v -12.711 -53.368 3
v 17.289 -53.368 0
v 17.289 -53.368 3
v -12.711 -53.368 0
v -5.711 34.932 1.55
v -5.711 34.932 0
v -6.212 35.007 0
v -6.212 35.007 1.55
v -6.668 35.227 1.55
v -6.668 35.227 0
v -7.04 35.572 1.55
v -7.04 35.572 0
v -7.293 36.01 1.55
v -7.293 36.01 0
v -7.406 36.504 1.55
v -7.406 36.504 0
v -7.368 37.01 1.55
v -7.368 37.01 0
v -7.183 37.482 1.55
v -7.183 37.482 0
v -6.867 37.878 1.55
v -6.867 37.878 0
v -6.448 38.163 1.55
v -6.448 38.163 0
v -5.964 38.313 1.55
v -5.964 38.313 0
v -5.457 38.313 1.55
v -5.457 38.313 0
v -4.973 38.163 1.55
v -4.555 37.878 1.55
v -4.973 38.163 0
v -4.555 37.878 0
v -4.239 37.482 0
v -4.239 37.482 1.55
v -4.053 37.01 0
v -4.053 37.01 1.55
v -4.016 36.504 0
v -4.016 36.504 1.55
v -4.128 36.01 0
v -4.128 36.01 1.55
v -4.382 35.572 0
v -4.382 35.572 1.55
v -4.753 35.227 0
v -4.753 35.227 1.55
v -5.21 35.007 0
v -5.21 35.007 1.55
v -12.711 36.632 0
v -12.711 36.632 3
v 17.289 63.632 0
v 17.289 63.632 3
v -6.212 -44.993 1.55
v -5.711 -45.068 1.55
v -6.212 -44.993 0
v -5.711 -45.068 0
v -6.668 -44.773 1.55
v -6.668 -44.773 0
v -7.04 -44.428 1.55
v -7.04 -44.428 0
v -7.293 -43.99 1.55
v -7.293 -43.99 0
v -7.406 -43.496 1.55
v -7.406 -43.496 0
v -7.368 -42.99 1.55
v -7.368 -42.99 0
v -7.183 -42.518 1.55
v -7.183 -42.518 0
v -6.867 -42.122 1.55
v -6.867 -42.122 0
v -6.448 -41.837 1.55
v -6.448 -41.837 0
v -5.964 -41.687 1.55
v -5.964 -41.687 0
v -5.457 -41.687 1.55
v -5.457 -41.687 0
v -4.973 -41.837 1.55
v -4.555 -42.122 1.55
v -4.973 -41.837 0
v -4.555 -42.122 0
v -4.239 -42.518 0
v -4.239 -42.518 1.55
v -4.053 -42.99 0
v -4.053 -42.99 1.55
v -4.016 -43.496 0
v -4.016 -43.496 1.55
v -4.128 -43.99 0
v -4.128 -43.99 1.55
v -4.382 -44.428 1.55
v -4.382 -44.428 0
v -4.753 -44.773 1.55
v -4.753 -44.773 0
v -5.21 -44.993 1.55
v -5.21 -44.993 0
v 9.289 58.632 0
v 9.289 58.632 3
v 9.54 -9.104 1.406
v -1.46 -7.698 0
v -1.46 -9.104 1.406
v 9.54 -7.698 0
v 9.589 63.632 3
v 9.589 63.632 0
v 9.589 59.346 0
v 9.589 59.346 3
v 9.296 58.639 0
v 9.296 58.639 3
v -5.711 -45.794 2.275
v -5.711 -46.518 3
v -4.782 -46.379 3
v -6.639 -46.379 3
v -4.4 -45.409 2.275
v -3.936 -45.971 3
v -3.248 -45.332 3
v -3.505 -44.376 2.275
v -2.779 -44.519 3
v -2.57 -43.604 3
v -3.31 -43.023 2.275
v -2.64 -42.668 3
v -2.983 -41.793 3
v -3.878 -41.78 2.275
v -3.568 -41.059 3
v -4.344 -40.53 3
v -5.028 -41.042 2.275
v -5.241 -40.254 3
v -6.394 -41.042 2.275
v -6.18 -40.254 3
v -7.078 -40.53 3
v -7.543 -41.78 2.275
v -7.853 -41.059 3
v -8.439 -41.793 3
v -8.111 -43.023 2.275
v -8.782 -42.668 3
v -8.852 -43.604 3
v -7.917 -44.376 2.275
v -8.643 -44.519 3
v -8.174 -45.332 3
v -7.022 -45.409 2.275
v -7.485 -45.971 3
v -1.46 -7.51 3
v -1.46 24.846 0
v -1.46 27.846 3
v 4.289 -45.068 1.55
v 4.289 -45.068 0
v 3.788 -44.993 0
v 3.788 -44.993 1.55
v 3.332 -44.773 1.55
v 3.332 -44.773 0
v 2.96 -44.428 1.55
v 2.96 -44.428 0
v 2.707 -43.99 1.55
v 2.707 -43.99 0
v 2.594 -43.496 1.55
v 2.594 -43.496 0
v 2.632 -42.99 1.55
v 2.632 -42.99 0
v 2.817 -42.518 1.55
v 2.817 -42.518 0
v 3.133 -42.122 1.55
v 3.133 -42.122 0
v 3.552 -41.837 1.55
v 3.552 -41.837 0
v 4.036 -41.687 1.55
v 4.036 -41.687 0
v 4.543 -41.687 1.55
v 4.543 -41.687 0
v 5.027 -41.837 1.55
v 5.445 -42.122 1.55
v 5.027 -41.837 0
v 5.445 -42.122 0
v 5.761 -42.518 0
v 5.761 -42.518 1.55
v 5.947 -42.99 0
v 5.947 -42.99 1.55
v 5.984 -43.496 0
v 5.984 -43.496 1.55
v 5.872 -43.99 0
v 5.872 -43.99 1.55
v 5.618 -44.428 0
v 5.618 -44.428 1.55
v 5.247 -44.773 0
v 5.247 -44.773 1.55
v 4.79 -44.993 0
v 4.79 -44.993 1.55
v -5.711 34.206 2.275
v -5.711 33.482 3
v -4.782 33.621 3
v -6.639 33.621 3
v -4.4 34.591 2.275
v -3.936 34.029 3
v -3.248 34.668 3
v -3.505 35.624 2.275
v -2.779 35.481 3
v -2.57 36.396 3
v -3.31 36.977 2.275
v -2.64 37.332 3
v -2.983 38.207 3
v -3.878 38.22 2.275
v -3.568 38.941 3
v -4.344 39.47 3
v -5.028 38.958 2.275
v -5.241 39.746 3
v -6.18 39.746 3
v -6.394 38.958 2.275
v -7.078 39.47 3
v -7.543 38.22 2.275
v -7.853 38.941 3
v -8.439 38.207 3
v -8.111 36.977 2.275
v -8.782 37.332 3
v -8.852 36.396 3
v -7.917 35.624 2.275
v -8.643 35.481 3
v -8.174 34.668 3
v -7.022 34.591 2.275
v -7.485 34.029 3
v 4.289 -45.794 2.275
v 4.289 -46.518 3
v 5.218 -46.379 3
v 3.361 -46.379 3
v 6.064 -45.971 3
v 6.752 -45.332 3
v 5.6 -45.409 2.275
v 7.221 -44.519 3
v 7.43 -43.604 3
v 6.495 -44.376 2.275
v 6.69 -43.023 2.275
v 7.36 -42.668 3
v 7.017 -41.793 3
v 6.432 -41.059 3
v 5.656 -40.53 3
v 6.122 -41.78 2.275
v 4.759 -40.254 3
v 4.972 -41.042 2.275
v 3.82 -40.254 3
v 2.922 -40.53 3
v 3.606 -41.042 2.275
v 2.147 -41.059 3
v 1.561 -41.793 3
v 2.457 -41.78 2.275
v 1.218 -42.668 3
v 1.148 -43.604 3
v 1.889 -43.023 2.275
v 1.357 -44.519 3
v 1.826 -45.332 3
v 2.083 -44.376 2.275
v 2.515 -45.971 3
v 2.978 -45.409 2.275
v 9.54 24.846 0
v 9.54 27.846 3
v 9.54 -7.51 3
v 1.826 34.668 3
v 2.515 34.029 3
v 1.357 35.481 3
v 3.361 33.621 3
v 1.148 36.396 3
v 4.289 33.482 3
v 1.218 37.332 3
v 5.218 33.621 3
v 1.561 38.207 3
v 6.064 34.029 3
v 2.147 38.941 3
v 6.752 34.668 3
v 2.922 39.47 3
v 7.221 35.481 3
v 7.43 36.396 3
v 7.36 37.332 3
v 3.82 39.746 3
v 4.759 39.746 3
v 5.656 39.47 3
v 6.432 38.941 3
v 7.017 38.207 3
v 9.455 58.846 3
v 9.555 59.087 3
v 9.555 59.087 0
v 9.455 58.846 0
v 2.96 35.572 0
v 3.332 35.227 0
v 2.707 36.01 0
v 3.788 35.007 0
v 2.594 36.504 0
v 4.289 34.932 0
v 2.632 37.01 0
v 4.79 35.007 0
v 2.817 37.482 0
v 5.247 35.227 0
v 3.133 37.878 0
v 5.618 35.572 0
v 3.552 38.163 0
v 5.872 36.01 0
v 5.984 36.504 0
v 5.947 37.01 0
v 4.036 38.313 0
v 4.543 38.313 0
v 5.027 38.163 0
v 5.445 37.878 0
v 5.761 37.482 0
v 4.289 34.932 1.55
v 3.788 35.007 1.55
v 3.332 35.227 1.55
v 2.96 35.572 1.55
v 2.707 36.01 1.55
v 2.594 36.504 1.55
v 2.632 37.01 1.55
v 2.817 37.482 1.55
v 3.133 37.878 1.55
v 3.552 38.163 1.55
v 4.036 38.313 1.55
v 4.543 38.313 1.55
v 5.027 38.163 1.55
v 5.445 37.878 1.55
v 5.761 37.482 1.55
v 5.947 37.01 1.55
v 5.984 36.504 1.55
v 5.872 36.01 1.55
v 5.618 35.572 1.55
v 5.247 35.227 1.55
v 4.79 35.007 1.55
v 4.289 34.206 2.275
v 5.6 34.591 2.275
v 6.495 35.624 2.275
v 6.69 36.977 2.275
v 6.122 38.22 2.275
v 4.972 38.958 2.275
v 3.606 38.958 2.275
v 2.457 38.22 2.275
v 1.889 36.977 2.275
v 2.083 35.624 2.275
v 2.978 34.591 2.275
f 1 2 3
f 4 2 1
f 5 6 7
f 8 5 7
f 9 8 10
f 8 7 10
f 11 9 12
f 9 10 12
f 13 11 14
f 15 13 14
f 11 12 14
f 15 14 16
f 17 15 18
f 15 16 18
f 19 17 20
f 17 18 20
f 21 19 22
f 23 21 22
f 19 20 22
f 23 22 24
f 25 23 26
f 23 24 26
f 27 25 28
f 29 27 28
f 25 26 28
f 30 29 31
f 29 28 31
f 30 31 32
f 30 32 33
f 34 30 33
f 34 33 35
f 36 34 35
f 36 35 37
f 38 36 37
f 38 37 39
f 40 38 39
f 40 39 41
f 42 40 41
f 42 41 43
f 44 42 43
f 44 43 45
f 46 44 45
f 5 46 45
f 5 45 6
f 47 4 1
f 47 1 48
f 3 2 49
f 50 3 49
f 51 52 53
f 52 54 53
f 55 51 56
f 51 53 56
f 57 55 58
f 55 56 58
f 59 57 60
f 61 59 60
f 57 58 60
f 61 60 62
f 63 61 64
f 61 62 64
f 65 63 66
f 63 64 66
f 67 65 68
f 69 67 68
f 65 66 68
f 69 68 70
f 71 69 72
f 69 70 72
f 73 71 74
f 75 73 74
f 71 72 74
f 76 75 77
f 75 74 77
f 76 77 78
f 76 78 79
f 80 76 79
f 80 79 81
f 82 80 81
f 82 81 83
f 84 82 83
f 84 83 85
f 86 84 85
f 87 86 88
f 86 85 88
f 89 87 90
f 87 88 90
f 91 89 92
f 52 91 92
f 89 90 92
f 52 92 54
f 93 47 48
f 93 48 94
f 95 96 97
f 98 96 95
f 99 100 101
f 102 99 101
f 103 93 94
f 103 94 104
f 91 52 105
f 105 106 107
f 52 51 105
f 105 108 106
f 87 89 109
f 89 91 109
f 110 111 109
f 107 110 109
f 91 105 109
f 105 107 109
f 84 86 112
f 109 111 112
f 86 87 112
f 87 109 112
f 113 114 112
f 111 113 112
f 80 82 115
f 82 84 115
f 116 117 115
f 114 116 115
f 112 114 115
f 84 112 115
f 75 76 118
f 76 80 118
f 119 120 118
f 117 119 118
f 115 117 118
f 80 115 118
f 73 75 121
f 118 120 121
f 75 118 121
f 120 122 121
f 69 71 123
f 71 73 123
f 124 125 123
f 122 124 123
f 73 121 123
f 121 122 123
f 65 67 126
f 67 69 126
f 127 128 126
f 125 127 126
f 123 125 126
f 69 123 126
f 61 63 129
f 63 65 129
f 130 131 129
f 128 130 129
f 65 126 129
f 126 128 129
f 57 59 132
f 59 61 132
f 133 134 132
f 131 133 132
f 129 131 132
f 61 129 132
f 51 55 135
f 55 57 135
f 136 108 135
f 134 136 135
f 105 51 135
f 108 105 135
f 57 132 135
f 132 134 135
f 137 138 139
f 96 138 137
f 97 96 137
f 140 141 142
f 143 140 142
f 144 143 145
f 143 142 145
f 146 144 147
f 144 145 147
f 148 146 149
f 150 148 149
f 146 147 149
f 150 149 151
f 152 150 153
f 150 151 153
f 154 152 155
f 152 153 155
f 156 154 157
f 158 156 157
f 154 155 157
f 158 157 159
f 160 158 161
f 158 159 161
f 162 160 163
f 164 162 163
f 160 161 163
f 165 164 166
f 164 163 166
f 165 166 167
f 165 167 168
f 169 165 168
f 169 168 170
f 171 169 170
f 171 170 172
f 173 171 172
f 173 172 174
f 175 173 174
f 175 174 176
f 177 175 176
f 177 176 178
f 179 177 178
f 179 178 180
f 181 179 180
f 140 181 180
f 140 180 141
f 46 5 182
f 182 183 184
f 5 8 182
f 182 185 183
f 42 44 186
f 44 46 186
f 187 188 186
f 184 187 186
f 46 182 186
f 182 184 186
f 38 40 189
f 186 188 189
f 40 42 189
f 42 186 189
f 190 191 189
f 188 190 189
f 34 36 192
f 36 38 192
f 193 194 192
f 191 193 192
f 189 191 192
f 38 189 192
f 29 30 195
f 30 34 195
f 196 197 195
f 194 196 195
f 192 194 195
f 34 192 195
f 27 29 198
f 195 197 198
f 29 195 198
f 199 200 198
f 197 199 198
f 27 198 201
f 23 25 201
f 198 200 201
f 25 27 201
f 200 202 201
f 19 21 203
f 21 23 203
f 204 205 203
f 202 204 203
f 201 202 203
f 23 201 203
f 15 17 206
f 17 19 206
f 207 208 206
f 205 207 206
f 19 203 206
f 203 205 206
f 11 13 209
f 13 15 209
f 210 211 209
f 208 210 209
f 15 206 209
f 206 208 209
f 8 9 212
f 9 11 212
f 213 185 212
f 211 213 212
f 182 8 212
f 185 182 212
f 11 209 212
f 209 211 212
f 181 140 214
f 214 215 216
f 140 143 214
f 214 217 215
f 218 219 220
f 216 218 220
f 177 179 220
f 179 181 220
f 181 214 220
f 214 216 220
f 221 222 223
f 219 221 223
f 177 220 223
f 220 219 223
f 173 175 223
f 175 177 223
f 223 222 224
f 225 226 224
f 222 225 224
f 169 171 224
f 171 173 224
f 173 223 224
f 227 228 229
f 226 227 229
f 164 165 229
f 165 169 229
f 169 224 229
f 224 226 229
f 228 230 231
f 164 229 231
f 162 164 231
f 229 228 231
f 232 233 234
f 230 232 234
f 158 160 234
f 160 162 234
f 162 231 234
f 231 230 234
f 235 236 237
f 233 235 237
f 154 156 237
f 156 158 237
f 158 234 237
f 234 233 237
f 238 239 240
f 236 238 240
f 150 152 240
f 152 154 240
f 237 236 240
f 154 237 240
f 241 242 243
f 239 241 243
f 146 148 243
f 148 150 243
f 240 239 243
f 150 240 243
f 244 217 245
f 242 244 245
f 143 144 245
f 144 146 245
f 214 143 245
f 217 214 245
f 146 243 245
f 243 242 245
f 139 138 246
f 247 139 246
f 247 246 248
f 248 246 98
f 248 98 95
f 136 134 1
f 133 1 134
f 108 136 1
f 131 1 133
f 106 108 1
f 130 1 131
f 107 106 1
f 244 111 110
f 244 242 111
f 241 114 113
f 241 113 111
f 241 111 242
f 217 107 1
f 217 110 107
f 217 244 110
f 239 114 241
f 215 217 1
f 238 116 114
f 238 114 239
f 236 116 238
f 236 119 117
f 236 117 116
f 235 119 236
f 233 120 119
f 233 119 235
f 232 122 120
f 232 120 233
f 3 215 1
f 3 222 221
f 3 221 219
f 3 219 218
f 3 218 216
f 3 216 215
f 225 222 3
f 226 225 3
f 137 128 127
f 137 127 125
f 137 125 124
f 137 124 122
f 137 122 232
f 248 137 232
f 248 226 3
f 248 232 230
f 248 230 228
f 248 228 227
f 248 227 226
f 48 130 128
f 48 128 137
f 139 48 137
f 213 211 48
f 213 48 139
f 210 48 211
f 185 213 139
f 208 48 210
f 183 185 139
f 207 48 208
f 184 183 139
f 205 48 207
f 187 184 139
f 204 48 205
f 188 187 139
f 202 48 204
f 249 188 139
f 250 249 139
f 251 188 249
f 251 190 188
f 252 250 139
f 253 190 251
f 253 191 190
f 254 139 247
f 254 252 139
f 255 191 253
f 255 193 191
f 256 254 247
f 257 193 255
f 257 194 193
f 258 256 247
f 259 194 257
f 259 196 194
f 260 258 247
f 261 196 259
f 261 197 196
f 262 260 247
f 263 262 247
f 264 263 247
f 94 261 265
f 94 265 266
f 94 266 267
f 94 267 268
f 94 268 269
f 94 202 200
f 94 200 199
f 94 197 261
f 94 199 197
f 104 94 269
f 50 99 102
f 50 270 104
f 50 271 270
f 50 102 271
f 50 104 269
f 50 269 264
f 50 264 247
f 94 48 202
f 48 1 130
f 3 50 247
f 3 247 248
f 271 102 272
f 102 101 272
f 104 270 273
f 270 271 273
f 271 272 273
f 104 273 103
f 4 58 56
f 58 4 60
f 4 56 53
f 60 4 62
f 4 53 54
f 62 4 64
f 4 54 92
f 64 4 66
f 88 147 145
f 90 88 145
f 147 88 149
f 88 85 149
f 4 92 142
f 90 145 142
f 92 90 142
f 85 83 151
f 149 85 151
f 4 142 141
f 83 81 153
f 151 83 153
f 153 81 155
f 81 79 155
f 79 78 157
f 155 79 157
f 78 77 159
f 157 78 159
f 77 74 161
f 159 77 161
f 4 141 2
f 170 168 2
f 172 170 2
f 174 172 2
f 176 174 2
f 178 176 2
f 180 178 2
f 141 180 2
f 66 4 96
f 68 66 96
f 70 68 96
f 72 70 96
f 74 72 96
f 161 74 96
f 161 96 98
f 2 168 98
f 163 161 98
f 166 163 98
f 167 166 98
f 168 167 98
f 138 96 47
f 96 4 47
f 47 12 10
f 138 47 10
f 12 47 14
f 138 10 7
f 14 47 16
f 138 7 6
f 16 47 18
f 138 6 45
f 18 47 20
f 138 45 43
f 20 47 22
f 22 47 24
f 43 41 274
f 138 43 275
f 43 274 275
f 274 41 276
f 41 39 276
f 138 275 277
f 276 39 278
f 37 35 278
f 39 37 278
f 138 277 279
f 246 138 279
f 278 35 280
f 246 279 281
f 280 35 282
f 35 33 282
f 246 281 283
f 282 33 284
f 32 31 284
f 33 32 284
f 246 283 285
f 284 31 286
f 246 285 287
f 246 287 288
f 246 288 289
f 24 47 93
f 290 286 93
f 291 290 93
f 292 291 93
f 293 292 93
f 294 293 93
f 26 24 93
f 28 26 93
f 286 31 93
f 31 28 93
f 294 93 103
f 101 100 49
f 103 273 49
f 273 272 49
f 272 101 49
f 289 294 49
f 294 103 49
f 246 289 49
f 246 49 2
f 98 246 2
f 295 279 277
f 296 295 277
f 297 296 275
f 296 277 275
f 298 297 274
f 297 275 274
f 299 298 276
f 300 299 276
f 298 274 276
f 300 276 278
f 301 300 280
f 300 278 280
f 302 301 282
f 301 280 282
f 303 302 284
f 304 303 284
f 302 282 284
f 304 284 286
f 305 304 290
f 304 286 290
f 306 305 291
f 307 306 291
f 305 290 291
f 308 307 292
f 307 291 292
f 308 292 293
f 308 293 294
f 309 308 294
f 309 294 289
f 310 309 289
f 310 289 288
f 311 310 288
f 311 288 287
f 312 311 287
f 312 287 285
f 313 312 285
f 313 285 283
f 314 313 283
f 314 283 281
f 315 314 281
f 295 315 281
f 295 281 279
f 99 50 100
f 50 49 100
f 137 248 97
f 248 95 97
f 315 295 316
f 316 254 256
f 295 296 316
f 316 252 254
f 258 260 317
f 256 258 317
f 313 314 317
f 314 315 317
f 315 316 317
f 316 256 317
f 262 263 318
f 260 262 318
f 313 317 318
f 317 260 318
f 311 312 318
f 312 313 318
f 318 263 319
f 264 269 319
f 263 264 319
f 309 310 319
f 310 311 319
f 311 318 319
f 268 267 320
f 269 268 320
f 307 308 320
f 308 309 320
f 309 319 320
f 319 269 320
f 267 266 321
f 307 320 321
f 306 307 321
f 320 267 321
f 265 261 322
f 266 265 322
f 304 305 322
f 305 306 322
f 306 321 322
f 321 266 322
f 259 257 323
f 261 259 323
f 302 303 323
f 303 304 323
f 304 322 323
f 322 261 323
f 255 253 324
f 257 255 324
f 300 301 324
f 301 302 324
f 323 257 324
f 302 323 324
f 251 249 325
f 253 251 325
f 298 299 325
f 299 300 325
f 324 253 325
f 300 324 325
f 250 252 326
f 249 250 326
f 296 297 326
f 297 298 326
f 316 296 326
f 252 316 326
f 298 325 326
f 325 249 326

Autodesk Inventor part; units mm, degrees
ref_plane "YZ Plane" through (0, 0, 0) normal (1, 0, 0) x (0, 1, 0)
ref_plane "XZ Plane" through (0, 0, 0) normal (0, 1, 0) x (-1, 0, 0)
ref_plane "XY Plane" through (0, 0, 0) normal (0, 0, 1) x (1, 0, 0)
sketch "Sketch1" plane through (0, 0, 0) normal (0, 0, 1) x (1, 0, 0)
  line L0 (17.2892, -53.3685) -> (9.2892, -53.3685) projected
  line L1 (-10.7108, -53.3685) -> (9.2892, -53.3685) projected
  line L2 (9.2892, 58.6315) -> (-10.7108, 38.6315) projected
  line L3 (17.2892, -53.3685) -> (17.2892, -49.7758) projected
  line L4 (17.2892, -46.9611) -> (17.2892, 27.2242) projected
  line L5 (17.2892, 30.0389) -> (17.2892, 41.6315) projected
  line L6 (17.2892, 41.6315) -> (17.2892, 51.5315) projected
  line L7 (17.2892, 63.6315) -> (17.2892, 56.6315) projected
  line L8 (9.2892, 63.6315) -> (17.2892, 63.6315) construction
  line L9 (17.2892, 63.6315) -> (9.5892, 63.6315)
  line L10 (9.5892, 63.6315) -> (9.5892, 59.3458)
  line L11 (9.2892, 58.6315) -> (9.2963, 58.6387)
  line L12 (9.2892, 60.6315) -> (9.2892, 63.6315) construction
  arc A0 (9.2963, 58.6387) -> (9.5892, 59.3458) centre (8.5892, 59.3458) ccw
  line L13 (17.2892, 27.2242) -> (17.2892, 30.0389)
  line L14 (17.2892, 51.5315) -> (17.2892, 56.6315)
  line L15 (17.2892, -49.7758) -> (17.2892, -46.9611)
  line L16 (-10.7108, -53.3685) -> (-12.7108, -53.3685)
  line L17 (-12.7108, -53.3685) -> (-12.7108, 36.6315)
  line L18 (-12.7108, 36.6315) -> (-10.7108, 38.6315)
  point P0 (0, 0)
  dimension "d2" = 0.3
  dimension "d3" = 1
  dimension "d19" = 30
extrude "Extrusion1" add sketch "Sketch1" along normal blind 3
ref_plane "Work Plane2" through (4.04, -8.0435, 0.345) normal (0, 0.7071, 0.7071) x (1, 0, 0)
sketch "Sketch3" plane through (4.04, -8.0435, 0.345) normal (0, 0.7071, 0.7071) x (1, 0, 0)
  line L0 (-4, 22) -> (-4, 0) construction
  line L1 (4, 22) -> (-4, 22) construction
  line L2 (4, 0) -> (4, 22) construction
  line L3 (-4, 0) -> (4, 0) construction
  line L4 (-5.5, 23.5) -> (-5.5, -1.5)
  line L5 (-5.5, 23.5) -> (5.5, 23.5)
  line L6 (5.5, 23.5) -> (5.5, -1.5)
  line L7 (5.5, -1.5) -> (-5.5, -1.5)
  point P0 (-4.04, 5.9315)
  dimension "d6" = 1.5
  dimension "d7" = 1.5
  dimension "d8" = 1.5
  dimension "d9" = 1.5
extrude "Extrusion2" cut sketch "Sketch3" along normal through all
sketch "Sketch4" plane through (0, 0, 3) normal (0, 0, 1) x (1, 0, 0)
  circle A0 centre (-5.7108, -43.3685) radius 2.25 projected
  circle A1 centre (4.2892, -43.3685) radius 2.25 projected
  circle A2 centre (-5.7108, 36.6315) radius 2.25 projected
  circle A3 centre (4.2892, 36.6315) radius 2.25 projected
  point P0 (0, 0)
hole "Hole1" at (-5.7108, -43.3685, 3) at (4.2892, -43.3685, 3) at (-5.7108, 36.6315, 3) at (4.2892, 36.6315, 3) direction (0, 0, -1) diameter 3.4 end through all countersink diameter 6.3 countersink angle 90 clearance for "Countersunk Flat Head Screw ISO 2009/7046" size "M3" standard "ISO"
equation "\"d7\" = d6"
equation "\"d8\" = d6"
equation "\"d9\" = d6"
properties part number "BokPrawy"
